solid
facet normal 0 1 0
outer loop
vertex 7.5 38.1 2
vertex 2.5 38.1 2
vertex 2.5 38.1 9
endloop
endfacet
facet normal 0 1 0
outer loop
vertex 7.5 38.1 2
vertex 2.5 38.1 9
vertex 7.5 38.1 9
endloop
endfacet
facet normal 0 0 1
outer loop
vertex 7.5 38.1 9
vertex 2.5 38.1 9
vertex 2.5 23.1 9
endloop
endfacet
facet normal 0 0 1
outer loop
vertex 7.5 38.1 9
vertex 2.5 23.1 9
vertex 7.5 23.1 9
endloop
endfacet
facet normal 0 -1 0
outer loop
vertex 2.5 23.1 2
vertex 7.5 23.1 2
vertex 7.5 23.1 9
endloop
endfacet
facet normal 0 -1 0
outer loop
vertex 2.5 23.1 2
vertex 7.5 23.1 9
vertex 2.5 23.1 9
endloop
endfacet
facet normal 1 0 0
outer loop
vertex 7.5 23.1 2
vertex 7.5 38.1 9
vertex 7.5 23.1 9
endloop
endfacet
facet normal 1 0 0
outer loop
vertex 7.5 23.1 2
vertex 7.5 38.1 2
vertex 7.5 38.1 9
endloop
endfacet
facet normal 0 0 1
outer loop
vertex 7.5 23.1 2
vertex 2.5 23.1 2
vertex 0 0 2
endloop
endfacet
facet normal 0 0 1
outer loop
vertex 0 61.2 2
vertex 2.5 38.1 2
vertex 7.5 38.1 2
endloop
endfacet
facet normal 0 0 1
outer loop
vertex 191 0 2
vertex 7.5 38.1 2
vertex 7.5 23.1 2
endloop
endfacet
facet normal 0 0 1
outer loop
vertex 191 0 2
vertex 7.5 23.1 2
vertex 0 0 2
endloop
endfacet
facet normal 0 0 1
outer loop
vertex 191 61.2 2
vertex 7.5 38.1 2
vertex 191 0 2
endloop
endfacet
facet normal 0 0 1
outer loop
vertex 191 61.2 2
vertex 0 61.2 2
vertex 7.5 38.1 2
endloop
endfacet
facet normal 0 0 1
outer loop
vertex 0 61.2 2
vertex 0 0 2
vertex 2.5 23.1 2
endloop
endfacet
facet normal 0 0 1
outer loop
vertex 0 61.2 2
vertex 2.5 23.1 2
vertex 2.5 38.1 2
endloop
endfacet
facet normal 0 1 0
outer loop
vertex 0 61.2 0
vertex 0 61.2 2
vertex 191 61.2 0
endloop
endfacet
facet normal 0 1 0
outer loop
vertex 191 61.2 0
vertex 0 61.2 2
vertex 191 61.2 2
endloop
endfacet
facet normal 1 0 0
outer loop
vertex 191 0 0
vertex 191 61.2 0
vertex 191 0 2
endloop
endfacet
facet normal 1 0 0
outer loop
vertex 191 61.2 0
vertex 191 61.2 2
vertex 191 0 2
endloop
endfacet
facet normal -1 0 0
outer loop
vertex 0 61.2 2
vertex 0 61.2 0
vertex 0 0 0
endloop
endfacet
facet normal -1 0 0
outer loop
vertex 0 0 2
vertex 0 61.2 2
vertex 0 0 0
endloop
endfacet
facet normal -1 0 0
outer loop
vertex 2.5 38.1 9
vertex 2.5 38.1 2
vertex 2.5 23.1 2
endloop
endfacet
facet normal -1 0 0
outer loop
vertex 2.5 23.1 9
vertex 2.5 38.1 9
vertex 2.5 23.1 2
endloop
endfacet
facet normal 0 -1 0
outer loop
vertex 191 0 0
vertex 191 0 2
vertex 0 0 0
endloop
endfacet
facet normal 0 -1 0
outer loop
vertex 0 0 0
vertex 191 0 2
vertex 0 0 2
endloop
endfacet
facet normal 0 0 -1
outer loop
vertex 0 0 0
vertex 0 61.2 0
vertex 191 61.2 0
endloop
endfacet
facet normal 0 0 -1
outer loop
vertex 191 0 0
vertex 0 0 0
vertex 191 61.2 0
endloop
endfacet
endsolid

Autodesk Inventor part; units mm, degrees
ref_plane "YZ Plane" through (0, 0, 0) normal (1, 0, 0) x (0, 1, 0)
ref_plane "XZ Plane" through (0, 0, 0) normal (0, 1, 0) x (-1, 0, 0)
ref_plane "XY Plane" through (0, 0, 0) normal (0, 0, 1) x (1, 0, 0)
sketch "Sketch1" plane through (0, 0, 0) normal (0, 1, 0) x (-1, 0, 0)
  point P0 (0, 0)
sketch "Sketch6" plane through (0, 0, 0) normal (0, 0, 1) x (1, 0, 0)
  line L0 (0, 0) -> (184, 0)
  line L1 (184, 0) -> (184, 61.2)
  line L2 (184, 61.2) -> (0, 61.2)
  line L3 (0, 61.2) -> (0, 0)
  line L4 (0, 0) -> (184, 0)
  line L5 (184, 0) -> (184, 61.2)
  dimension "d18" = 184
  dimension "d19" = 61.2
extrude "Extrusion5" add sketch "Sketch6" along normal blind 2
sketch "Sketch7" plane through (0, 0, 2) normal (0, 0, 1) x (1, 0, 0)
  line L0 (184, 61.2) -> (0, 61.2) projected
  line L1 (0, 61.2) -> (0, 30.6)
  line L2 (0, 30.6) -> (2.5, 30.6)
  line L3 (2.5, 30.6) -> (2.5, 38.1)
  line L4 (2.5, 30.6) -> (2.5, 23.1)
  line L5 (2.5, 38.1) -> (7.5, 38.1)
  line L6 (7.5, 38.1) -> (7.5, 23.1)
  line L7 (7.5, 23.1) -> (2.5, 23.1)
  point P0 (0, 0)
  dimension "d22" = 30.6
  dimension "d23" = 2.5
  dimension "d24" = 7.5
  dimension "d25" = 7.5
  dimension "d26" = 5
extrude "Extrusion6" add sketch "Sketch7" along normal blind 7
sketch "Sketch8" plane through (0, 0, 2) normal (0, 0, 1) x (1, 0, 0)
  line L0 (184, 61.2) -> (0, 61.2) projected
  line L1 (184, 61.2) -> (191, 61.2)
  line L2 (191, 61.2) -> (191, 0)
  line L3 (191, 0) -> (184, 0)
  line L4 (184, 0) -> (184, 61.2)
  point P0 (0, 0)
  dimension "d29" = 7
extrude "Extrusion7" add sketch "Sketch8" against normal blind 2
sketch "Sketch2" plane through (0, 0, 0) normal (0, 1, 0) x (-1, 0, 0)
  line L0 (0, 0) -> (92.58, 0)
  line L1 (92.58, 0) -> (92.58, -29.35)
  line L2 (92.58, -29.35) -> (0, -29.35)
  line L3 (0, -29.35) -> (0, 29.35)
  line L4 (0, 29.35) -> (92.58, 29.35)
  line L5 (92.58, 29.35) -> (92.58, -29.35)
  dimension "d0" = 92.58
  dimension "d1" = 29.35
  dimension "d2" = 92.58
  dimension "d3" = 58.7
sketch "Sketch3" plane through (0, 3, 0) normal (0, 1, 0) x (1, 0, 0)
  line L0 (0, 0) -> (-10, 0)
  line L1 (-10, 0) -> (-10, 7.5)
  line L2 (-10, 7.5) -> (-15, 7.5)
  line L3 (-15, 7.5) -> (-15, -7.5)
  line L4 (-15, -7.5) -> (-10, -7.5)
  line L5 (-10, -7.5) -> (-10, 7.5)
  dimension "d6" = 10
  dimension "d7" = 7.5
  dimension "d8" = 5
  dimension "d9" = 15
sketch "Sketch4" plane through (0, 3, 0) normal (0, 1, 0) x (1, 0, 0)
  line L0 (0, -29.35) -> (0, 29.35) projected
  line L1 (0, -29.35) -> (0, -34.35)
  line L2 (0, -34.35) -> (-5, -34.35)
  line L3 (-5, -34.35) -> (-5, -29.35)
  line L4 (-92.58, -29.35) -> (0, -29.35) projected
  line L5 (-5, -29.35) -> (0, -29.35)
  point P0 (0, 0)
  dimension "d12" = 5
  dimension "d13" = 5
sketch "Sketch5" plane through (0, 8, 0) normal (0, 1, 0) x (1, 0, 0)
  line L0 (-15, 7.5) -> (-15, -7.5) projected
  line L1 (-10, -7.5) -> (-10, 7.5) projected
  line L2 (-15, 7.5) -> (-10, 7.5)
  line L3 (-10, 7.5) -> (-10, -7.5)
  line L4 (-10, -7.5) -> (-15, -7.5)
  line L5 (-15, -7.5) -> (-15, 7.5)
  point P0 (0, 0)
equation "\"d2\" = d0"
equation "\"d3\" = 2 * d1"
equation "\"d9\" = 2 * d7"
properties part number "Door"
